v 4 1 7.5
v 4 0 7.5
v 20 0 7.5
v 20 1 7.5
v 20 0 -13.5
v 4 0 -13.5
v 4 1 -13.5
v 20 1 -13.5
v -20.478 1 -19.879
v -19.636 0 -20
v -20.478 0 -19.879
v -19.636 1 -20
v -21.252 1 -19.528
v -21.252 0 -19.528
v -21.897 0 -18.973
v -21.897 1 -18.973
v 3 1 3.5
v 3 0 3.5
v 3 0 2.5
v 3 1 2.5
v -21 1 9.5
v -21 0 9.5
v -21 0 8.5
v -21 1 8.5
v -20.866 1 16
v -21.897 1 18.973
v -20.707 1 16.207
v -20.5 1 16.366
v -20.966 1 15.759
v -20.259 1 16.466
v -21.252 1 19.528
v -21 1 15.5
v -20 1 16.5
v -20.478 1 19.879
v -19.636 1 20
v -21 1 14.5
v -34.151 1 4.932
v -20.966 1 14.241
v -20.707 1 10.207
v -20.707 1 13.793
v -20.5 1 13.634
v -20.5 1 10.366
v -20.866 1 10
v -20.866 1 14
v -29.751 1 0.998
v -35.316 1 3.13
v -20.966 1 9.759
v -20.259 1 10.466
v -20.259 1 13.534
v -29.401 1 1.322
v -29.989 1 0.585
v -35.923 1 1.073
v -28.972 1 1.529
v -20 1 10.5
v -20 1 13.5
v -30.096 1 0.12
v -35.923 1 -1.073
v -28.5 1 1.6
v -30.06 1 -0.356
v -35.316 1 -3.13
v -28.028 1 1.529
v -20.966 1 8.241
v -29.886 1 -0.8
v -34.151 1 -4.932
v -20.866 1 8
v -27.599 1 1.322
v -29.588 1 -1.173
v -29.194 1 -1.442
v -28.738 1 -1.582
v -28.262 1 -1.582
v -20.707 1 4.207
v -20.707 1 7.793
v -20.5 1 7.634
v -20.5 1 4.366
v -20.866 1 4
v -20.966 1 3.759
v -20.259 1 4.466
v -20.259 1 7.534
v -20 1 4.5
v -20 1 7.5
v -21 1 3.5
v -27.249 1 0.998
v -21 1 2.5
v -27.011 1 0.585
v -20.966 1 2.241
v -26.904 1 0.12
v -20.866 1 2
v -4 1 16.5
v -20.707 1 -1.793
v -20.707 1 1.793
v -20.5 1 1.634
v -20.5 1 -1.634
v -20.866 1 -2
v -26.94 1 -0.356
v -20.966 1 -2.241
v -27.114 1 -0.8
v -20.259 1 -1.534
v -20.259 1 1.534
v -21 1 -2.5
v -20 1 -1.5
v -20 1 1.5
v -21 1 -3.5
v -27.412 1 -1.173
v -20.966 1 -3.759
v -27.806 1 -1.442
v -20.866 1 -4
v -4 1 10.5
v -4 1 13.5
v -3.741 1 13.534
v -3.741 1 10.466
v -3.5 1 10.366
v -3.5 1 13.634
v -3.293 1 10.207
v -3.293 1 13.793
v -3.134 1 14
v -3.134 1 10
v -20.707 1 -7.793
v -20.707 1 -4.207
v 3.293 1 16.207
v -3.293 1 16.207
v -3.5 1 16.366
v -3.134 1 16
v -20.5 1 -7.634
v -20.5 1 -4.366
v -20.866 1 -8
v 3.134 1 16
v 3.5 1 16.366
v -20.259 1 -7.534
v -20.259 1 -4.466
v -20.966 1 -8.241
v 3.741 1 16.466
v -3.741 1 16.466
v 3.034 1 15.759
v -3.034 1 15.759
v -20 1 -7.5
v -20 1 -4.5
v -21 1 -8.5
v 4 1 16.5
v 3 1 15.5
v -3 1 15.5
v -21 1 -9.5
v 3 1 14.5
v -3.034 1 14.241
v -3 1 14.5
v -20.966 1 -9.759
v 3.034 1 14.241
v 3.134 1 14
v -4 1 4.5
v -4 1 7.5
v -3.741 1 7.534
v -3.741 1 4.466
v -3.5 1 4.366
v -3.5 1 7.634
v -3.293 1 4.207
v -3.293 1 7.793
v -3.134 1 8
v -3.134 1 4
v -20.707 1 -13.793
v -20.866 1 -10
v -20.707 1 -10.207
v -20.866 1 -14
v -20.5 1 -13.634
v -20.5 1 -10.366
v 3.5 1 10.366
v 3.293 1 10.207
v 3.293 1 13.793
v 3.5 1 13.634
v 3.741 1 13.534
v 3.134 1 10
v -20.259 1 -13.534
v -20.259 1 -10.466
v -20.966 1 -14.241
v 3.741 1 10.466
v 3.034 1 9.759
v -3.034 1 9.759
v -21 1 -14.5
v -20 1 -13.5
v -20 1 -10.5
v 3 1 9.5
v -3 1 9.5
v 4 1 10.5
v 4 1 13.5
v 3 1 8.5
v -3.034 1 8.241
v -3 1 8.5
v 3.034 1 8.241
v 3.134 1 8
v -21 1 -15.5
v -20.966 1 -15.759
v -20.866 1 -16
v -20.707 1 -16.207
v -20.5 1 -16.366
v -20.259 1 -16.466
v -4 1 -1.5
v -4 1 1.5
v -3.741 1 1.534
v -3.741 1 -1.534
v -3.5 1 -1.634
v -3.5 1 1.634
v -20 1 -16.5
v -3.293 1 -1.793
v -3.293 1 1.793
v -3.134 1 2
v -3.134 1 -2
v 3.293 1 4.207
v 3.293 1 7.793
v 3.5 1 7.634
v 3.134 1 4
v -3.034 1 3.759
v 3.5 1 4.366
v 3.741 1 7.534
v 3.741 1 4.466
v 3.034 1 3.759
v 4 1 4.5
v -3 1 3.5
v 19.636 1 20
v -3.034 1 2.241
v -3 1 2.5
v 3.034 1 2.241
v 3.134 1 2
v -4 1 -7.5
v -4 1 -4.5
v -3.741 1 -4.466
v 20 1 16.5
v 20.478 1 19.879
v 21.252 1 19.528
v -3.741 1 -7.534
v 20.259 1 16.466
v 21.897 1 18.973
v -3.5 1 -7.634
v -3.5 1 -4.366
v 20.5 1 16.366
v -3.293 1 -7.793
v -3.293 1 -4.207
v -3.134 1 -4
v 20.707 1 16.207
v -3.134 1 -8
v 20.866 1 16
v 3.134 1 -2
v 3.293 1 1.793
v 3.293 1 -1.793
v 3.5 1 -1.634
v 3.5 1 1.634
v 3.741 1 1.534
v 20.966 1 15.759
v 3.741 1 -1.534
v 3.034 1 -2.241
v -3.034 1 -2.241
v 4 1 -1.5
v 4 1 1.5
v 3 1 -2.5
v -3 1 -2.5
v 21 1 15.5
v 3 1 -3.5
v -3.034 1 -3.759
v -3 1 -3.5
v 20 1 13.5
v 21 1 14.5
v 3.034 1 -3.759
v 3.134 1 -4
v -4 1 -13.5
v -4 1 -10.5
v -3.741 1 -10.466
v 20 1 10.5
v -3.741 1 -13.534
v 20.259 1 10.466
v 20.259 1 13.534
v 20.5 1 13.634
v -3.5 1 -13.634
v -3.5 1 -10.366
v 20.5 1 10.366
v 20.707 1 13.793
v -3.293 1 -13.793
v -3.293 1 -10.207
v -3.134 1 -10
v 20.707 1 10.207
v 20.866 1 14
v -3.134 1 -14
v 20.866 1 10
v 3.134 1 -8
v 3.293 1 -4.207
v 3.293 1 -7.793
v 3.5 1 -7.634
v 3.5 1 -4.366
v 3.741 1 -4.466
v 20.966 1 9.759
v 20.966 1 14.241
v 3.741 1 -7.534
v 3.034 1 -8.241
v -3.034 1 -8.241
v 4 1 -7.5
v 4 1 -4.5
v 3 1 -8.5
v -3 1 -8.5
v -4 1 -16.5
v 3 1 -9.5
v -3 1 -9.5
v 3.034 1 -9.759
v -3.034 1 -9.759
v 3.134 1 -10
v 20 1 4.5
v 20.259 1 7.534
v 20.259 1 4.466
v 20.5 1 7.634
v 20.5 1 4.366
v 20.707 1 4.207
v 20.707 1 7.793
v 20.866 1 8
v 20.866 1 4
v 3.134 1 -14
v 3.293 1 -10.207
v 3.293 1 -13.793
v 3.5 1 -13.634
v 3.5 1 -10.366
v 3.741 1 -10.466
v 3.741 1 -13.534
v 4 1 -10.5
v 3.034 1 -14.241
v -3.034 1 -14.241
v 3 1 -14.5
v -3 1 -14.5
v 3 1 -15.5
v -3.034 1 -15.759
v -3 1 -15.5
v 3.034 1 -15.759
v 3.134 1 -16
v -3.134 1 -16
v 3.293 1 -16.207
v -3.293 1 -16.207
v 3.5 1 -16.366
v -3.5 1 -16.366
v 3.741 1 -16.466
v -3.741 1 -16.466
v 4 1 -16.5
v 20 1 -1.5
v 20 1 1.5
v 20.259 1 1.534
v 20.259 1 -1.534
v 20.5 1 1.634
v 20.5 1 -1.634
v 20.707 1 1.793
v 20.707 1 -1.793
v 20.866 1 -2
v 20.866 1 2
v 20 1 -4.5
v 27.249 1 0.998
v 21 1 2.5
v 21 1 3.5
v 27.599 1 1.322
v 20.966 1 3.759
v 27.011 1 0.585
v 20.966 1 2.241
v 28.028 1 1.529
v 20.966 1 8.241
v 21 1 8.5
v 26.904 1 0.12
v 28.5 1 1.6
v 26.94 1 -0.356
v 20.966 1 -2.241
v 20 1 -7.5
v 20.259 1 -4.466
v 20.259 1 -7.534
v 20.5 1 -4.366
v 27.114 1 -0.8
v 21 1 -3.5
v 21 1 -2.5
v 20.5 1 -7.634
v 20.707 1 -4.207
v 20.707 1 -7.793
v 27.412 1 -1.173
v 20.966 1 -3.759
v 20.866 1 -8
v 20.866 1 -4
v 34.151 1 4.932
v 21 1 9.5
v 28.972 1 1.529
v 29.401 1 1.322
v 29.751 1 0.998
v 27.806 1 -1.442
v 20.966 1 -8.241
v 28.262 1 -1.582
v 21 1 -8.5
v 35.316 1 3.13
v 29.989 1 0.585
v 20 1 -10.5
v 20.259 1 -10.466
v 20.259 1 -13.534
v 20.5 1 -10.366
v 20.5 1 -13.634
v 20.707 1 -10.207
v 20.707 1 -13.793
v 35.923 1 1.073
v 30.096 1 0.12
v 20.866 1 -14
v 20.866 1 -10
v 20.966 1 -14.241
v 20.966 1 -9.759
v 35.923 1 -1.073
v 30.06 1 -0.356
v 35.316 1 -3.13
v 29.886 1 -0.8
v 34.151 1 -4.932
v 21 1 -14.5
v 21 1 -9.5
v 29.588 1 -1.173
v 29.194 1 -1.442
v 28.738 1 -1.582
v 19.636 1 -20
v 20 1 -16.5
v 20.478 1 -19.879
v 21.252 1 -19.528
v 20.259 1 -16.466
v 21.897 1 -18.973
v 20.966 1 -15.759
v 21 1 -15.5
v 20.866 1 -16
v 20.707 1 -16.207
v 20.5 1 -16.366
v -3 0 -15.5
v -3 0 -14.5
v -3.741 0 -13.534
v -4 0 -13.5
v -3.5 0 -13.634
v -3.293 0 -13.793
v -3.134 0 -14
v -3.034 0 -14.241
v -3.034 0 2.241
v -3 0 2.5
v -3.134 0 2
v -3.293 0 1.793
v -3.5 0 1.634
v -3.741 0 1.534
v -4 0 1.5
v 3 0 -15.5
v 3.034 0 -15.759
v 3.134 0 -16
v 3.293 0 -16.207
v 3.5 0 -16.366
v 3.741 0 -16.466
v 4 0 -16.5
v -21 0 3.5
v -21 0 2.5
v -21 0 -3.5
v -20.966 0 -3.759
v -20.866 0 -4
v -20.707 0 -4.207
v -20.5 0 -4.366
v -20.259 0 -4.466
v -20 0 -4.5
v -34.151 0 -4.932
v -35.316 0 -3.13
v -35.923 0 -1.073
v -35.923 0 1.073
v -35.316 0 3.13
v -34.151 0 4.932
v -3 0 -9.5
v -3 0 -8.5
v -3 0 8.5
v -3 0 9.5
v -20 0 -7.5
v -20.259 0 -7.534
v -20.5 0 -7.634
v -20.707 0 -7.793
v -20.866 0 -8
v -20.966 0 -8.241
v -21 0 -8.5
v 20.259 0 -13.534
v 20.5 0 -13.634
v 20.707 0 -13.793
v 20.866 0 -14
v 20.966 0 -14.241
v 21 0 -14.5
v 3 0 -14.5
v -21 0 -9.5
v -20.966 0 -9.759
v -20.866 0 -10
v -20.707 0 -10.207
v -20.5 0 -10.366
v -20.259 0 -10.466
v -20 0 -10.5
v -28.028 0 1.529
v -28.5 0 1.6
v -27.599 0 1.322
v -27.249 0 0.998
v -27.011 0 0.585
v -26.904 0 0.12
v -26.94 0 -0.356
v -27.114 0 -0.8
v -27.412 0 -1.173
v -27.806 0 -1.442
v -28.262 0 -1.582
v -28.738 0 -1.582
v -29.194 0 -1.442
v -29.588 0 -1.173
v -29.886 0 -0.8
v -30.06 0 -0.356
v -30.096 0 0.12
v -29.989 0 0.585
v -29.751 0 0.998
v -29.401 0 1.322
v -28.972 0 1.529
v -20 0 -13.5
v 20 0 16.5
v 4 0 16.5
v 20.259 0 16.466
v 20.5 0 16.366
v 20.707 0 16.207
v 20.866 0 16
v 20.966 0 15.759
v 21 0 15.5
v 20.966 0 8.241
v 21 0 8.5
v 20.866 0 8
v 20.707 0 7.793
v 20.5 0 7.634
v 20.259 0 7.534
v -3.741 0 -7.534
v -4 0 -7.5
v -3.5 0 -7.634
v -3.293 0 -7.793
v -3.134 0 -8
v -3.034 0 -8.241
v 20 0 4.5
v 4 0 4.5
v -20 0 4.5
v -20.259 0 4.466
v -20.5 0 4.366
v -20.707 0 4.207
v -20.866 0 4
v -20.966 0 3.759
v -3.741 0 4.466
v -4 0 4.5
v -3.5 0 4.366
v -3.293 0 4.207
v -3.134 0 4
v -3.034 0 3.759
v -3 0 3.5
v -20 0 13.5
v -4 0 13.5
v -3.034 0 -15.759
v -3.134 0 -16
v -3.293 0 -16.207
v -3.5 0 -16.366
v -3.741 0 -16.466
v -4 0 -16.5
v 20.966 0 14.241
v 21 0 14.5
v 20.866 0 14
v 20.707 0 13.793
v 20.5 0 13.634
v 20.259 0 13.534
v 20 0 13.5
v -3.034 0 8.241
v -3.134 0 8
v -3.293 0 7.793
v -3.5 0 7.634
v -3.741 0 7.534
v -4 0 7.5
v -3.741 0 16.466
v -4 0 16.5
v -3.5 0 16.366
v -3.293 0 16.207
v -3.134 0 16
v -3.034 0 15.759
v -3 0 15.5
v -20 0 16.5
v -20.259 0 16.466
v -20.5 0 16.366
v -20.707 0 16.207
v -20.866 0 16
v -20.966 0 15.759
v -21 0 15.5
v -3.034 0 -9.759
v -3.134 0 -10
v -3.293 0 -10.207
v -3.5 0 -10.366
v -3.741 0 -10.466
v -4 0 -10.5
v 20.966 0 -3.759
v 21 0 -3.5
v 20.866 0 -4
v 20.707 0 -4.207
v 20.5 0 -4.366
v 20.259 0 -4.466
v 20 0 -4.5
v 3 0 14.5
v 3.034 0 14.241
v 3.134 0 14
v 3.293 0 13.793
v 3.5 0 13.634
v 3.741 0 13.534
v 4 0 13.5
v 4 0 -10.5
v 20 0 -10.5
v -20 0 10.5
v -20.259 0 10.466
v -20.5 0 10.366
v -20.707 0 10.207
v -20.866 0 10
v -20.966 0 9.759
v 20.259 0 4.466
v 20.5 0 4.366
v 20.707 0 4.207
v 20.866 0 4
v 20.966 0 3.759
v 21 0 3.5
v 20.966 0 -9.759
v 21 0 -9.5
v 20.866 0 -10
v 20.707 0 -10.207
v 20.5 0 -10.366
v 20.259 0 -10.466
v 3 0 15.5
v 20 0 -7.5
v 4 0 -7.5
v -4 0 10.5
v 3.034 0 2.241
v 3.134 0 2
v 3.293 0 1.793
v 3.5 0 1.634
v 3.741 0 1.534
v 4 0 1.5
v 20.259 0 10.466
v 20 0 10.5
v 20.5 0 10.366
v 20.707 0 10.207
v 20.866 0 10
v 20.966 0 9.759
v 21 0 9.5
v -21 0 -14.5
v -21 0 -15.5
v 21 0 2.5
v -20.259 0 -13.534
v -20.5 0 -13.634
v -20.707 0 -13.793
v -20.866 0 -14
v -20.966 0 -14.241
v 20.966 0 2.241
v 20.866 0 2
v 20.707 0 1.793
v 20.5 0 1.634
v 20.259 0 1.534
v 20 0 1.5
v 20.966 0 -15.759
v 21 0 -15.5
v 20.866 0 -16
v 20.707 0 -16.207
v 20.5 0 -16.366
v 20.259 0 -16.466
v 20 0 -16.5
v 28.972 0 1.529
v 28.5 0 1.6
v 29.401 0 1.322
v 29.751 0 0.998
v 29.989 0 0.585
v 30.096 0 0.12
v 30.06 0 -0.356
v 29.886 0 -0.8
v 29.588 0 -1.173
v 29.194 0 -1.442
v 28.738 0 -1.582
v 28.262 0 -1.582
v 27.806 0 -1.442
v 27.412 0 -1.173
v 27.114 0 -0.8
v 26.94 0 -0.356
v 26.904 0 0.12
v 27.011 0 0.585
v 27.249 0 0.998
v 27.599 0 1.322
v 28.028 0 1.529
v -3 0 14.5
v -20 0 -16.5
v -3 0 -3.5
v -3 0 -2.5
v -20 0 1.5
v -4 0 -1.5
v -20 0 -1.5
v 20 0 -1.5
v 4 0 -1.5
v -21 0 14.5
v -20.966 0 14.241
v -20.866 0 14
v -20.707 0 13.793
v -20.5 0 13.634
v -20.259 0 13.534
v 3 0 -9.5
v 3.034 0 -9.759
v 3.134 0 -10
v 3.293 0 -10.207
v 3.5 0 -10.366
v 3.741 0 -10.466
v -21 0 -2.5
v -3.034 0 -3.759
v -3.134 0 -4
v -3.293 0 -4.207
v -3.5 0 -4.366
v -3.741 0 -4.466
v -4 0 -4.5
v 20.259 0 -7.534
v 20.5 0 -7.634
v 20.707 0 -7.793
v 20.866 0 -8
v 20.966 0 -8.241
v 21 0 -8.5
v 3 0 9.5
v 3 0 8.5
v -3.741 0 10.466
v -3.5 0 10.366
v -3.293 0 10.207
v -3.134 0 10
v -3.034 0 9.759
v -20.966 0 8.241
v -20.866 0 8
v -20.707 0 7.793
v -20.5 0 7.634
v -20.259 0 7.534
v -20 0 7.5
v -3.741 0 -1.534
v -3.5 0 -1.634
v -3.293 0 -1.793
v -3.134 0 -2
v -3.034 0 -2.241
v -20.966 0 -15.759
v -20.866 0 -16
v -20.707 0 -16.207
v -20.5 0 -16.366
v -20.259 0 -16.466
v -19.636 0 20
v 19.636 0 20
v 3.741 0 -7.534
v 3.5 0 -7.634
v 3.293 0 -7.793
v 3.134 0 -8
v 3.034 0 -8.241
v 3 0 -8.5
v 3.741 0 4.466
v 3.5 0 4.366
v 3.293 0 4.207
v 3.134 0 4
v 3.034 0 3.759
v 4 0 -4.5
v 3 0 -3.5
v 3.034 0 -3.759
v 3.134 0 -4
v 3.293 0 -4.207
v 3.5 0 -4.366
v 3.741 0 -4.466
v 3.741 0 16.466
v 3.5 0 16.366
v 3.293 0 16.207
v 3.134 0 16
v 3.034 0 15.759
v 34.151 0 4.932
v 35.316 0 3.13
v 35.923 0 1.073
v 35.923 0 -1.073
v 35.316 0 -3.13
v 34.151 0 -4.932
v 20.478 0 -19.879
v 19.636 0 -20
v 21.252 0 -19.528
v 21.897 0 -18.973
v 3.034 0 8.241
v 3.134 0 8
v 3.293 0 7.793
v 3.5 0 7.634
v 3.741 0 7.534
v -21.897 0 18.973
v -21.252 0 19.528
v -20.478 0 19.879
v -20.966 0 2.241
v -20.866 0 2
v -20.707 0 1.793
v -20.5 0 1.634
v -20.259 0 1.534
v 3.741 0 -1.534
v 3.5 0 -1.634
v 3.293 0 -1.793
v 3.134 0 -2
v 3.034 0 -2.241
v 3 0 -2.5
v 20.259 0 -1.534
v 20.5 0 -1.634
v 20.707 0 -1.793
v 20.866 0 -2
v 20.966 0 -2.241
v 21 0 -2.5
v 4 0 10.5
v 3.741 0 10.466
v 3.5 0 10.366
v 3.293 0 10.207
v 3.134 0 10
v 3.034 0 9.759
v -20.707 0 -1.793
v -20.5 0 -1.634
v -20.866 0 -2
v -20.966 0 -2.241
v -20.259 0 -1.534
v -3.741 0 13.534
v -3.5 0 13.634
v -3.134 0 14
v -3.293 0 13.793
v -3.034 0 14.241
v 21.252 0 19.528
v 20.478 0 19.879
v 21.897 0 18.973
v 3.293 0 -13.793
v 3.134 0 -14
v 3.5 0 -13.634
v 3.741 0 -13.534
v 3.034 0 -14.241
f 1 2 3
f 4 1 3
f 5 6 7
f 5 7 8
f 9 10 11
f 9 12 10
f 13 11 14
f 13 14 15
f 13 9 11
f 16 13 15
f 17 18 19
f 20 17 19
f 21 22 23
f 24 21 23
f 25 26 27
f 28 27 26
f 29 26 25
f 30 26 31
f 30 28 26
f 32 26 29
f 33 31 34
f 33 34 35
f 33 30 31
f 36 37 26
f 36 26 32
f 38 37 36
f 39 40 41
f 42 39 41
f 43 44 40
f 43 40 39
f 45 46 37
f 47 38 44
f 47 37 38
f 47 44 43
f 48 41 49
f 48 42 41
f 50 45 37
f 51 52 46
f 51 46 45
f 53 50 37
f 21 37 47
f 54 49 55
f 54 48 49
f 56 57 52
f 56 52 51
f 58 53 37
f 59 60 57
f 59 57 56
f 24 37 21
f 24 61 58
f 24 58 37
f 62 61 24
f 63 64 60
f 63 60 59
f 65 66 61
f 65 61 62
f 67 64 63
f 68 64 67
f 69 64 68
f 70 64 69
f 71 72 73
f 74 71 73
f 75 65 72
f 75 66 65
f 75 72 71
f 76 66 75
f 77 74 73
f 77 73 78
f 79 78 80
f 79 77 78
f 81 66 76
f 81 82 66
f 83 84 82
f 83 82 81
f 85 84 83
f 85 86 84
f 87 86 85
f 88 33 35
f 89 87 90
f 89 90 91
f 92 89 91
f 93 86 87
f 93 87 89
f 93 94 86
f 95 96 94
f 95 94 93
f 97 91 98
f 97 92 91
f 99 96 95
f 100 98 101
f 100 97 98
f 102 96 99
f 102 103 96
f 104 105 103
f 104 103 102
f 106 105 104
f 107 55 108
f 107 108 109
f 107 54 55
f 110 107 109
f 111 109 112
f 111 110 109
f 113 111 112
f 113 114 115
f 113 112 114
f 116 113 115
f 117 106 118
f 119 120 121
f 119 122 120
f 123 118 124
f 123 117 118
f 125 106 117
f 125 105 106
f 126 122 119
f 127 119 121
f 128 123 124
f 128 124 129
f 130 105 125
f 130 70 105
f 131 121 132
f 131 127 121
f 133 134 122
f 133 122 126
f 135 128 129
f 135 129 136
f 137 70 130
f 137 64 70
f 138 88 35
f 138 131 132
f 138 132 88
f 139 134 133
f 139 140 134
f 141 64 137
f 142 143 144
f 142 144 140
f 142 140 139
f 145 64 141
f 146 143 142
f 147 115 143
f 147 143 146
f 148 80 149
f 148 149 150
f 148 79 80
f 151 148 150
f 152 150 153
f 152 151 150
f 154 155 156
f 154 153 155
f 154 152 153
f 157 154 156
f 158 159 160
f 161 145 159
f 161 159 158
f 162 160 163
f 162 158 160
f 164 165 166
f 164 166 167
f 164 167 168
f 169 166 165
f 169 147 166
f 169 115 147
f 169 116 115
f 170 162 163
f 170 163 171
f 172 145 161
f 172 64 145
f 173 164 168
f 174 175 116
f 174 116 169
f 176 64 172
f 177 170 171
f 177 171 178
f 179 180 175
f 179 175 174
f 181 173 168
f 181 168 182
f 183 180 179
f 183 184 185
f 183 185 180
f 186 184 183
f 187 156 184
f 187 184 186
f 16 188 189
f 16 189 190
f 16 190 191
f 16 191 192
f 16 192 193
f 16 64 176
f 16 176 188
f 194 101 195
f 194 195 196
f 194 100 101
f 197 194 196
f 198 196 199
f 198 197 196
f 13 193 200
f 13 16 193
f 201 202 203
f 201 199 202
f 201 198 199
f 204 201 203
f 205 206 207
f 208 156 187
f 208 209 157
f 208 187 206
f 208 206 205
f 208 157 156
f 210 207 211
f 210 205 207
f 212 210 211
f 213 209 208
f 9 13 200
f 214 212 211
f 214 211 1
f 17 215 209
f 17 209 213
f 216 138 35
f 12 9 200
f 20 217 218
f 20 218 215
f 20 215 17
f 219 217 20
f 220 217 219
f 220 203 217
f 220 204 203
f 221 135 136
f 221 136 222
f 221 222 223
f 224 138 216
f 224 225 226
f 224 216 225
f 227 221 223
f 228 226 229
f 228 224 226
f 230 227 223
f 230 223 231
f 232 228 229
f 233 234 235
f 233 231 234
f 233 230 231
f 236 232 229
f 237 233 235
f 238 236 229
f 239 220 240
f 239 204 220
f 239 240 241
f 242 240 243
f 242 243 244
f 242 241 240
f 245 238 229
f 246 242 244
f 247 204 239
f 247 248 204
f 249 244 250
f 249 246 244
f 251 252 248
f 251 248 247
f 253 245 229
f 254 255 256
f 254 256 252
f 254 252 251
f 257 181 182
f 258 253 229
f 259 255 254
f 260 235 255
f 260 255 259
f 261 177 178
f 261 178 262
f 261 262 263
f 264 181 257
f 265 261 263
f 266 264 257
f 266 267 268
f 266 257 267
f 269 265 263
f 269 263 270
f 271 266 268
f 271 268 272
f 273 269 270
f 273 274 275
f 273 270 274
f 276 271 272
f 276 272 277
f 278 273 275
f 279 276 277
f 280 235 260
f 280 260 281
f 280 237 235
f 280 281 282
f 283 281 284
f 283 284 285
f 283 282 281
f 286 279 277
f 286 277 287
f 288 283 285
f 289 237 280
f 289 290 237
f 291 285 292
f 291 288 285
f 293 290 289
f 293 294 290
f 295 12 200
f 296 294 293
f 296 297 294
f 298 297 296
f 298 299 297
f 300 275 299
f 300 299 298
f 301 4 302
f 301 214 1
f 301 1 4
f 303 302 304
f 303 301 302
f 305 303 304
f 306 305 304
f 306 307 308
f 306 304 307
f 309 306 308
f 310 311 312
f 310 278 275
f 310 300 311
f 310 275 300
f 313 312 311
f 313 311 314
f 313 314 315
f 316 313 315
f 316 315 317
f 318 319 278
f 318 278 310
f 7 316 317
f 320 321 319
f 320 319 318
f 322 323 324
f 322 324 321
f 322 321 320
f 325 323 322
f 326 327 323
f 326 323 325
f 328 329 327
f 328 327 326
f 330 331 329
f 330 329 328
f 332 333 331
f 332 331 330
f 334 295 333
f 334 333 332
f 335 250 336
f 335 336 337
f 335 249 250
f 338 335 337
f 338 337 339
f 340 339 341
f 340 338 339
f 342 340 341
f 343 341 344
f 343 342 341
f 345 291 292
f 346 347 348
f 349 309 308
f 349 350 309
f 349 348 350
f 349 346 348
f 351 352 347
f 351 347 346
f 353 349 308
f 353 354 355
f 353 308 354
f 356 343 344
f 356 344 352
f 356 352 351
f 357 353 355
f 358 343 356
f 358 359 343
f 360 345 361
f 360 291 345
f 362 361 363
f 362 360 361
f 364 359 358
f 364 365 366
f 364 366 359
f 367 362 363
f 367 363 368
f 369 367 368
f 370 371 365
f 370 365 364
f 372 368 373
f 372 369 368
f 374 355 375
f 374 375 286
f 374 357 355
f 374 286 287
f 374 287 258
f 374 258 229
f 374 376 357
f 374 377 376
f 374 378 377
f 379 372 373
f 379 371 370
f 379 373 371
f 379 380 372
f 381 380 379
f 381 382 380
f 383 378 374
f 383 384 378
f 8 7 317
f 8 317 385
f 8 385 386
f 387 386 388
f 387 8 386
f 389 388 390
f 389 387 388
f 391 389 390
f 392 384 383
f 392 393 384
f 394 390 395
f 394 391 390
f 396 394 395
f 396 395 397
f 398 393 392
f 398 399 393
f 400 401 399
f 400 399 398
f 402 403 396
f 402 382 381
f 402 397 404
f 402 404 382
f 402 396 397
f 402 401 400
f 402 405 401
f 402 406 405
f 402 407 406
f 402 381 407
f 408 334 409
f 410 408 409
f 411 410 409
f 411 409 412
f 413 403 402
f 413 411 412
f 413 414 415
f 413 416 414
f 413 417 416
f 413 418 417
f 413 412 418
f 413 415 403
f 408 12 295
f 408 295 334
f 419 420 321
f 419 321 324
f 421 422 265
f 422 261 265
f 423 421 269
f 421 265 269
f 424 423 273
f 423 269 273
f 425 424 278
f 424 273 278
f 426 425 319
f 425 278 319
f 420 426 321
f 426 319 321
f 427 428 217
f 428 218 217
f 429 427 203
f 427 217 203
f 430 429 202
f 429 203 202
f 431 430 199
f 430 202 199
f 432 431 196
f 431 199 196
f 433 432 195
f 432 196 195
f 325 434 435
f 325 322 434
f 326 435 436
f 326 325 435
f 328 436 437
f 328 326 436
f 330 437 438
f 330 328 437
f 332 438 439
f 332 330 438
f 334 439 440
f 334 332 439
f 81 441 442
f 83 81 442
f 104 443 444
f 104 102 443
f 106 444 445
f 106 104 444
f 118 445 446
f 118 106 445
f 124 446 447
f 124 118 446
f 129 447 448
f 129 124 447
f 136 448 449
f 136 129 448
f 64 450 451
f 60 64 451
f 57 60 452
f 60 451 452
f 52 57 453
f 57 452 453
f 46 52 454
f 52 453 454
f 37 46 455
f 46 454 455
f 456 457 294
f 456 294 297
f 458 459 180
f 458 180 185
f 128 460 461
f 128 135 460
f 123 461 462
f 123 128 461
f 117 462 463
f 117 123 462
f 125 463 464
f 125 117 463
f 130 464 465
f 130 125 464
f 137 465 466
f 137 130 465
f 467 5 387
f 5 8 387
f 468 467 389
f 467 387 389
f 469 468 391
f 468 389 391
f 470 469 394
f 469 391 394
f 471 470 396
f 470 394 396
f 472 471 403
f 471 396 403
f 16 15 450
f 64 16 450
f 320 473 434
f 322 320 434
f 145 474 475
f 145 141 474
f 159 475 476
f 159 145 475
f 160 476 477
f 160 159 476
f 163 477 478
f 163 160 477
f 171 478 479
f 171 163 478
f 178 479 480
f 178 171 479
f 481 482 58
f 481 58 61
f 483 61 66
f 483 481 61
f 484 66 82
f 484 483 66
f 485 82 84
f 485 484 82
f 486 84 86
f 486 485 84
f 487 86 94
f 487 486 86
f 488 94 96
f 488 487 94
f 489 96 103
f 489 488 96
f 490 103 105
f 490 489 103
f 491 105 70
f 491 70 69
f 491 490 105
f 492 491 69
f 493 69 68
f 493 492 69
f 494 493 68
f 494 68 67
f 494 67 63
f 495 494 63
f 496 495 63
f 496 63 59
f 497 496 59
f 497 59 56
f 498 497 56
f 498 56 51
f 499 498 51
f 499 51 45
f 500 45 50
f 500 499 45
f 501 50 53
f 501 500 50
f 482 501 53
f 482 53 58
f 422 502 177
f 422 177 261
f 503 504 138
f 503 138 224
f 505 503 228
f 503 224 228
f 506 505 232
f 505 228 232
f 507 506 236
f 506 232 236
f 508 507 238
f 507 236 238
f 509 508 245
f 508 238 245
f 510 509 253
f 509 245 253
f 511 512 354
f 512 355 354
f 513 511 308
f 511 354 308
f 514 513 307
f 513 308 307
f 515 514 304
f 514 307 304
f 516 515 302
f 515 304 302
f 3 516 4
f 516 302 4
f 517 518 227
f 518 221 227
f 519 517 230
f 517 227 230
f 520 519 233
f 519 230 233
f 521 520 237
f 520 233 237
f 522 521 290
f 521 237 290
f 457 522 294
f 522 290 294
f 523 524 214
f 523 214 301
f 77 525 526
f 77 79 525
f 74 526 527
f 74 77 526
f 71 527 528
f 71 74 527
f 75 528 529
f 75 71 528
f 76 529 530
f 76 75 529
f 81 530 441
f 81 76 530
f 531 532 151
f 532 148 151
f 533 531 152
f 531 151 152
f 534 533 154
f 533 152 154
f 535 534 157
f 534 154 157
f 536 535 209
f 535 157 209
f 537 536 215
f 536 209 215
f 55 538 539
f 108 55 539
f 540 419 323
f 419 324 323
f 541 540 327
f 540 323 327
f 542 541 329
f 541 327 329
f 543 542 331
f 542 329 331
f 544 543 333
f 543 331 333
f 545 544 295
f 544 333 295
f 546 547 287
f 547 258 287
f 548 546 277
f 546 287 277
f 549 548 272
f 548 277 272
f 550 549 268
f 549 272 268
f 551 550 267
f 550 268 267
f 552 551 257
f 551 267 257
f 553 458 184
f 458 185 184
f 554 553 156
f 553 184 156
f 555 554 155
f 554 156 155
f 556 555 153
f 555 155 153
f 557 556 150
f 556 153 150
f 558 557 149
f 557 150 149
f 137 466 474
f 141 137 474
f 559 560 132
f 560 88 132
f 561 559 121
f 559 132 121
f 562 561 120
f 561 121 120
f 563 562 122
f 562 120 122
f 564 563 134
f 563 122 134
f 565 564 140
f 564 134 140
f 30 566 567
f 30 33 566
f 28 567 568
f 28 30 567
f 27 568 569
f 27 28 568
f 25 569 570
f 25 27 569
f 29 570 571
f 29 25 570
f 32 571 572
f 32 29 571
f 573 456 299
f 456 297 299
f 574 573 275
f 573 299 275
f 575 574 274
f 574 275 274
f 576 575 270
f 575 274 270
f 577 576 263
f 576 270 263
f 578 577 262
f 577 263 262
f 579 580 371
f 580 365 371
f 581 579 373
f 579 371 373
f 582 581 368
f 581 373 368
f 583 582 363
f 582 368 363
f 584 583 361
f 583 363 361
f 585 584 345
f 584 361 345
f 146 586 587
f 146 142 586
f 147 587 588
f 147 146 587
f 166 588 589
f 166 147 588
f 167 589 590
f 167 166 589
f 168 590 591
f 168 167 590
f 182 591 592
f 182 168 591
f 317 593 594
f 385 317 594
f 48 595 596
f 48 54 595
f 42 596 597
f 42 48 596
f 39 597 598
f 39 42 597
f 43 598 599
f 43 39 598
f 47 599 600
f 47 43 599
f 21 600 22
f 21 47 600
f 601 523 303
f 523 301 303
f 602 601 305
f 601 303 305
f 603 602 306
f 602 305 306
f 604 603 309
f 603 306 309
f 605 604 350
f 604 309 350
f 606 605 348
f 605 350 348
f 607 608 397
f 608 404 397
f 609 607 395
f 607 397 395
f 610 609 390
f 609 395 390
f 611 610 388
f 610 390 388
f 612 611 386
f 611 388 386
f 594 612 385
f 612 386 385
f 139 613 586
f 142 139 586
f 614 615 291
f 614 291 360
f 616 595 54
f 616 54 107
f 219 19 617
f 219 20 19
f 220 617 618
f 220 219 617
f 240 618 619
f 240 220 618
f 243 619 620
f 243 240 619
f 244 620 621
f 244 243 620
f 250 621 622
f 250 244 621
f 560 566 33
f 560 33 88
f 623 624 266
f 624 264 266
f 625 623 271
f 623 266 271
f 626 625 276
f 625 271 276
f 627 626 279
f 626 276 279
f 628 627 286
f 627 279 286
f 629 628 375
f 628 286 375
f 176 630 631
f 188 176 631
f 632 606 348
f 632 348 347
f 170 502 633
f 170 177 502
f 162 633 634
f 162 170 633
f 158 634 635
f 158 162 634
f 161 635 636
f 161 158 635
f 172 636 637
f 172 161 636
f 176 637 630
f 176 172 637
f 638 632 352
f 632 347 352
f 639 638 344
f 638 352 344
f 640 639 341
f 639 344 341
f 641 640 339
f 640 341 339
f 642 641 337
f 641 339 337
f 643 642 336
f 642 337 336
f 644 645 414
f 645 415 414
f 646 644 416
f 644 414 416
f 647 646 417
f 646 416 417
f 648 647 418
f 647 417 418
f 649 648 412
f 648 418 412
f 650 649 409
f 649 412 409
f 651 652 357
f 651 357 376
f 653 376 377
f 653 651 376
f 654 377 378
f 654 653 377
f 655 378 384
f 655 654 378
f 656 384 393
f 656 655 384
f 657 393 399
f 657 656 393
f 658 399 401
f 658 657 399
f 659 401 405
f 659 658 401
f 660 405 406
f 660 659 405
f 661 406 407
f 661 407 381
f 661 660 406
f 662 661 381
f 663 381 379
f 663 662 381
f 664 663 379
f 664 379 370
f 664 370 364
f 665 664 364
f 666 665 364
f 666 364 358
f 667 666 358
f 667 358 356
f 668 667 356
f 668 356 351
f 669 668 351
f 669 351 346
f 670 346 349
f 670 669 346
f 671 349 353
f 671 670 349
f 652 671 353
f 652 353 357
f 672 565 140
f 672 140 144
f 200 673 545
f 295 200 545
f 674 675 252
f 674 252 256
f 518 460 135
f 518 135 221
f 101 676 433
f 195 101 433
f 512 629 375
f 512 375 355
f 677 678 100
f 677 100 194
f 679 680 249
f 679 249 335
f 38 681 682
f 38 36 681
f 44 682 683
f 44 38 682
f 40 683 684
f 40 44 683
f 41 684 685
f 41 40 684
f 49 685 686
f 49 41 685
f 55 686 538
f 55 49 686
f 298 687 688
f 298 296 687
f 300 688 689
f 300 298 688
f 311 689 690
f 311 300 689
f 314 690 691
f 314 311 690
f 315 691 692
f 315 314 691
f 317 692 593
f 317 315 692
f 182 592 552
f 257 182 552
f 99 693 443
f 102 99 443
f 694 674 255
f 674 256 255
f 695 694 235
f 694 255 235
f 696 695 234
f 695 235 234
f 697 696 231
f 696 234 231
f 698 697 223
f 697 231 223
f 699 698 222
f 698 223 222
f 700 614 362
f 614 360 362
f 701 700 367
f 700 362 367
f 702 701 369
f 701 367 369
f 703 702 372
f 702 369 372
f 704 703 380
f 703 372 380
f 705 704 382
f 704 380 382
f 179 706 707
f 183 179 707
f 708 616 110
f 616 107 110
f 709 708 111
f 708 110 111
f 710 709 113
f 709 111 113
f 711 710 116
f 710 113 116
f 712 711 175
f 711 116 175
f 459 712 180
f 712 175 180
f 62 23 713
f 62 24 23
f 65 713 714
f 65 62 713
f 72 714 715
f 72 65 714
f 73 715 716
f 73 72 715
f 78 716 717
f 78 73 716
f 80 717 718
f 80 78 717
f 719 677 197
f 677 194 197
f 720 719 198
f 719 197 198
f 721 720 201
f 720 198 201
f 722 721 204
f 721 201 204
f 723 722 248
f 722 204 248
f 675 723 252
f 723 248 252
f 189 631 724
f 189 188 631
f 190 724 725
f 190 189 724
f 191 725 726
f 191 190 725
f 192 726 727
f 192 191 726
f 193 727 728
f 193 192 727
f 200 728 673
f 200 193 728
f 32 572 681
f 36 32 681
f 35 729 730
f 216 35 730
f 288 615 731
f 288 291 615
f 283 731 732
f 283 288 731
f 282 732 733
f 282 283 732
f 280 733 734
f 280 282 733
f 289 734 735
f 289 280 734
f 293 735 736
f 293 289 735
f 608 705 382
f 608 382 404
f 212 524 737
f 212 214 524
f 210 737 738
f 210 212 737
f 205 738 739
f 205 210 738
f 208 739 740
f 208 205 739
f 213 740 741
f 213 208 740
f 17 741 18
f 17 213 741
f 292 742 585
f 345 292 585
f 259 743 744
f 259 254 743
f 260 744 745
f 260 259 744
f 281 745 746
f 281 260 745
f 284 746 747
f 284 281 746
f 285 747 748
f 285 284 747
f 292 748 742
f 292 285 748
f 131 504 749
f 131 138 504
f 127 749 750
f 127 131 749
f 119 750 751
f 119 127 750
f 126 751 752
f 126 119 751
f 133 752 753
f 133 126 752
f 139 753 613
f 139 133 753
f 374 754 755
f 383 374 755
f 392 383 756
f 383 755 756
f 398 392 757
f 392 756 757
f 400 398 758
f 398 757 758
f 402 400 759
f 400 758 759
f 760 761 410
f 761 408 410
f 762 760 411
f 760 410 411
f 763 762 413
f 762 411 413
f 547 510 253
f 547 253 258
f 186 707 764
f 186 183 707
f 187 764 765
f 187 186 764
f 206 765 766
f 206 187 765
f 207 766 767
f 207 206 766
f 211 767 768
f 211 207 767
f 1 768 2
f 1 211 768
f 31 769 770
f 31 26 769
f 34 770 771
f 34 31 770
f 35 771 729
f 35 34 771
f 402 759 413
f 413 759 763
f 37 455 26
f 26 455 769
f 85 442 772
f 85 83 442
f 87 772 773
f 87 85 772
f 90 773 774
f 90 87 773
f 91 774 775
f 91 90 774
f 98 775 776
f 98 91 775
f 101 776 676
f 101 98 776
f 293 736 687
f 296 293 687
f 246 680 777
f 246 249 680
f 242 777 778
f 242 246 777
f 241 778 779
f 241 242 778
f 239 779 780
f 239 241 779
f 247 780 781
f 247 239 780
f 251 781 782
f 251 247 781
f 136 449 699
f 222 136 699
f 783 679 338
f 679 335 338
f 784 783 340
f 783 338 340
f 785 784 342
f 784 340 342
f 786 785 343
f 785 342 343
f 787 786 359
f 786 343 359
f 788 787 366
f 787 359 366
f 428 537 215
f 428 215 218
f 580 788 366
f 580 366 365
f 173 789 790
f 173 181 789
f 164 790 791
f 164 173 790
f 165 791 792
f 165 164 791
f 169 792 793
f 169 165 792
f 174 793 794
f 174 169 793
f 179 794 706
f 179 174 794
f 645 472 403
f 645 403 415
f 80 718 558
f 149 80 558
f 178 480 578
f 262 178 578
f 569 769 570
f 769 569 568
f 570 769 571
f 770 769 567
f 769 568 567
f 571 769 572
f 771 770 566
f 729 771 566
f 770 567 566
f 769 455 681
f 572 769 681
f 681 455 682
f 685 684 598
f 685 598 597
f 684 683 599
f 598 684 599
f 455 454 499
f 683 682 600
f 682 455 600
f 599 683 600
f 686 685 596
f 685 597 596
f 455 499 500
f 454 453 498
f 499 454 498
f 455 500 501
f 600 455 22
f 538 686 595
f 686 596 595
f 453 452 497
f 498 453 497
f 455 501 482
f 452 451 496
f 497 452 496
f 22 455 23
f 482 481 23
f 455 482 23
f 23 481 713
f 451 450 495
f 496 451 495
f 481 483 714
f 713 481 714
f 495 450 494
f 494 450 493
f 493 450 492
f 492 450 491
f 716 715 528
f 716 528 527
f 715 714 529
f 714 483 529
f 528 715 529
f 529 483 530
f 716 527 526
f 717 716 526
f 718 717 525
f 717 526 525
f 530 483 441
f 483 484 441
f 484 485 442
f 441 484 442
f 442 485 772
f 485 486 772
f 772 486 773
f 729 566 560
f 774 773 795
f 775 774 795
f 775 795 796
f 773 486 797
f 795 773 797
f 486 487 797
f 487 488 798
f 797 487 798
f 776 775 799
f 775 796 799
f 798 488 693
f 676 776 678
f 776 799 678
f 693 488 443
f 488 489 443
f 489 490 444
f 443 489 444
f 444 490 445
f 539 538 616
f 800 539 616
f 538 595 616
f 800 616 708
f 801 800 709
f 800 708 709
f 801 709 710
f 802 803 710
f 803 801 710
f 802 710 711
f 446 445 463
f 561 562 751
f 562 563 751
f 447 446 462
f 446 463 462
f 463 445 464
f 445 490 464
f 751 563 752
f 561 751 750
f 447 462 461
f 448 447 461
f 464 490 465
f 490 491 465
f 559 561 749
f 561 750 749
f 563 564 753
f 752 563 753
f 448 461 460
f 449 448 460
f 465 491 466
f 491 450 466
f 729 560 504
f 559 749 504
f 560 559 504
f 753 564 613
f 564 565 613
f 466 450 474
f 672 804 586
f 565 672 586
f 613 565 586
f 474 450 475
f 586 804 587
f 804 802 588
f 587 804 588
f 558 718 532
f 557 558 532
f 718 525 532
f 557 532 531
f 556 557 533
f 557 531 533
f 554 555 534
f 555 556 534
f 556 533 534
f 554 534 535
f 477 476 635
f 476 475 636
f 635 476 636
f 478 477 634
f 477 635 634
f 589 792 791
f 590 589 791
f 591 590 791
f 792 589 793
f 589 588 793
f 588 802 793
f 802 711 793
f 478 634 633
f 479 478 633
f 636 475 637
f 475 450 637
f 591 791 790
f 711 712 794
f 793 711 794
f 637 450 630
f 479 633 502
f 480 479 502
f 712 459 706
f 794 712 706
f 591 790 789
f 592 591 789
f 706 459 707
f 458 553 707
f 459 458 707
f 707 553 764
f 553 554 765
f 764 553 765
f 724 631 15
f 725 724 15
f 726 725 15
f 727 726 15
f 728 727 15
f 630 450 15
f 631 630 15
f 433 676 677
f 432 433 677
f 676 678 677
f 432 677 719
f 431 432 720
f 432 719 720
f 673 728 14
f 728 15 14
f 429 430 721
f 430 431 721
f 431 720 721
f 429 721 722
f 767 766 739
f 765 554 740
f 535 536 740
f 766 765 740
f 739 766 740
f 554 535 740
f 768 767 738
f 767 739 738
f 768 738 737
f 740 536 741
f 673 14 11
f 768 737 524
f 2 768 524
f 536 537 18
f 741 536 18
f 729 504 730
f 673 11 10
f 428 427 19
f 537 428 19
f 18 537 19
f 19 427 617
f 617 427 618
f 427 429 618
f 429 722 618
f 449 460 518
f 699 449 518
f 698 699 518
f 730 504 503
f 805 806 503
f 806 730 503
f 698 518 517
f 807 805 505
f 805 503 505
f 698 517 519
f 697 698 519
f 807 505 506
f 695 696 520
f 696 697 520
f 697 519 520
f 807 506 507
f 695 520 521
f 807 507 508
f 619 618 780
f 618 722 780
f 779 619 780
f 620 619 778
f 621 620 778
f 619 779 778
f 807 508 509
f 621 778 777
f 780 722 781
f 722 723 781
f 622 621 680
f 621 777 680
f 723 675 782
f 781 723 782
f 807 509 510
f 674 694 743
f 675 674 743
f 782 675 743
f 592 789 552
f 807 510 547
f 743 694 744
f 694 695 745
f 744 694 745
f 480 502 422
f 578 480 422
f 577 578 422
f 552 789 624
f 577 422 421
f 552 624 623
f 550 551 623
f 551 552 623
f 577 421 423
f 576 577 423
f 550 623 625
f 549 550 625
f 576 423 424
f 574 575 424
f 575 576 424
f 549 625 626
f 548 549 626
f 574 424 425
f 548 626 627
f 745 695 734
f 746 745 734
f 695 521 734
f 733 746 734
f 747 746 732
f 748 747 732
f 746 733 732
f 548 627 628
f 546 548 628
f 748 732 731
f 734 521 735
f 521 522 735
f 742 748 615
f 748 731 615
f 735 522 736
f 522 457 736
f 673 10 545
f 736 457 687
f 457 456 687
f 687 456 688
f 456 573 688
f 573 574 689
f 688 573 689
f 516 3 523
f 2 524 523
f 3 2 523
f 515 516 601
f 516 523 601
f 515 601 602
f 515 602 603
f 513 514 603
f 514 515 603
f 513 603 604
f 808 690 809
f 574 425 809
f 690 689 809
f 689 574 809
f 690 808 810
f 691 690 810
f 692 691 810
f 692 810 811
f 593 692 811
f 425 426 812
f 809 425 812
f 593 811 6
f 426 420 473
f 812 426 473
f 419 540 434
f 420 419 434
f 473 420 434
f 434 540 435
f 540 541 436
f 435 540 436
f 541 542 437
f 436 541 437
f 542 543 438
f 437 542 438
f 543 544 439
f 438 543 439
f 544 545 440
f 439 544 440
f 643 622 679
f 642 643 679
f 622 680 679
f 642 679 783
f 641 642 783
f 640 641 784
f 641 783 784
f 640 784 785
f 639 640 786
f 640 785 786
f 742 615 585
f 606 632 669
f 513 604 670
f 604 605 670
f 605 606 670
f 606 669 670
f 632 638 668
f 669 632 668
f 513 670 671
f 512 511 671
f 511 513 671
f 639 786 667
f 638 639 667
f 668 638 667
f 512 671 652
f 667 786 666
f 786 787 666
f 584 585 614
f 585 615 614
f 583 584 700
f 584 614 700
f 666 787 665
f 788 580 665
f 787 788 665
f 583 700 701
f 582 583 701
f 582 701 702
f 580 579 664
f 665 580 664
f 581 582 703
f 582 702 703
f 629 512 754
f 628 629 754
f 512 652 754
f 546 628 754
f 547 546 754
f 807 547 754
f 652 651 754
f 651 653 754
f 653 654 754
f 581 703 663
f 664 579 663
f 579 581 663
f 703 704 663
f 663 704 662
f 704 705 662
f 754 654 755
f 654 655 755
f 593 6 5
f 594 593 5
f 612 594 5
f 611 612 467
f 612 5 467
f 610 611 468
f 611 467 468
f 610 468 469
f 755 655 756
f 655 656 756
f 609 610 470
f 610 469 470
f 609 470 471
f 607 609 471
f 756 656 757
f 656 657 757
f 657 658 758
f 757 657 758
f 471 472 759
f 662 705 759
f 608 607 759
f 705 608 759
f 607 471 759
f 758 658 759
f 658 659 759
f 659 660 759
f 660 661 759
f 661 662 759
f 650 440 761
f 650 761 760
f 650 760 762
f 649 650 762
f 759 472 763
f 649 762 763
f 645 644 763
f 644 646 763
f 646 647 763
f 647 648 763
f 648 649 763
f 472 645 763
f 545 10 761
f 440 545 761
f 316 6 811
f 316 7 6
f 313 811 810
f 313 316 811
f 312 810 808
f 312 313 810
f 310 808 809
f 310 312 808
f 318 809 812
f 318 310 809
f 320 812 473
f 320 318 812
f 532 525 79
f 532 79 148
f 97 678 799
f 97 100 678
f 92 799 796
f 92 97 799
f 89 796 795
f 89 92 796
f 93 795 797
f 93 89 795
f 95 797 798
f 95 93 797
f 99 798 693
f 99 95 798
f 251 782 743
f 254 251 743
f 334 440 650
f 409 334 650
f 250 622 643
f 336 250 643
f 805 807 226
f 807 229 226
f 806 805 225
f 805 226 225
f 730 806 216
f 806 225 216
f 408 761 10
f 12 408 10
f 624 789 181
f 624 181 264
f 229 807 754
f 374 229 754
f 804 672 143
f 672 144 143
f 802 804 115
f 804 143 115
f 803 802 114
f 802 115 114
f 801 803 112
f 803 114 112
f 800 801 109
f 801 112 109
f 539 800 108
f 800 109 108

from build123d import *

# Parameters (mm, degrees)
SKETCH_1_W      = 18
SKETCH_1_H      = 3
SKETCH_1_R      = 1.6
EXTRUDE_1_DEPTH = 1
FILLET_1_R      = 3
FILLET_2_R      = 1


with BuildPart() as part:
    # 草图1 → 凸台-拉伸1 (new body)
    with BuildSketch(Plane(origin=(0, 0, 0), x_dir=(1, 0, 0), z_dir=(0, 1, 0))):
        with BuildLine():
            Line((21, 20), (-21, 20))
            Line((-21, 20), (-34.150684932, 4.931506849))
            ThreePointArc((-34.150684932, 4.931506849), (-36, 0), (-34.150684932, -4.931506849))
            Line((-34.150684932, -4.931506849), (-21, -20))
            Line((-21, -20), (21, -20))
            Line((21, -20), (34.150684932, -4.931506849))
            ThreePointArc((34.150684932, -4.931506849), (36, 0), (34.150684932, 4.931506849))
            Line((34.150684932, 4.931506849), (21, 20))
        make_face()
        with Locations((-12, -15)):
            Rectangle(SKETCH_1_W, SKETCH_1_H, mode=Mode.SUBTRACT)
        with Locations((-12, -9)):
            Rectangle(SKETCH_1_W, SKETCH_1_H, mode=Mode.SUBTRACT)
        with Locations((-12, -3)):
            Rectangle(SKETCH_1_W, SKETCH_1_H, mode=Mode.SUBTRACT)
        with Locations((12, -15)):
            Rectangle(SKETCH_1_W, SKETCH_1_H, mode=Mode.SUBTRACT)
        with Locations((12, -9)):
            Rectangle(SKETCH_1_W, SKETCH_1_H, mode=Mode.SUBTRACT)
        with Locations((12, -3)):
            Rectangle(SKETCH_1_W, SKETCH_1_H, mode=Mode.SUBTRACT)
        with Locations((-12, 3)):
            Rectangle(SKETCH_1_W, SKETCH_1_H, mode=Mode.SUBTRACT)
        with Locations((-12, 9)):
            Rectangle(SKETCH_1_W, SKETCH_1_H, mode=Mode.SUBTRACT)
        with Locations((-12, 15)):
            Rectangle(SKETCH_1_W, SKETCH_1_H, mode=Mode.SUBTRACT)
        with Locations((12, 3)):
            Rectangle(SKETCH_1_W, SKETCH_1_H, mode=Mode.SUBTRACT)
        with Locations((12, 9)):
            Rectangle(SKETCH_1_W, SKETCH_1_H, mode=Mode.SUBTRACT)
        with Locations((12, 15)):
            Rectangle(SKETCH_1_W, SKETCH_1_H, mode=Mode.SUBTRACT)
        with Locations(Location((-28.5, 0, 0), (0, 0, 270))):
            Circle(SKETCH_1_R, mode=Mode.SUBTRACT)
        with Locations(Location((28.5, 0, 0), (0, 0, 270))):
            Circle(SKETCH_1_R, mode=Mode.SUBTRACT)
    extrude(amount=EXTRUDE_1_DEPTH)

    # 圆角1
    fillet_1_edges = [part.edges().sort_by_distance(p)[0] for p in [
        (21, 0.5, 20),
        (-21, 0.5, 20),
        (-21, 0.5, -20),
        (21, 0.5, -20),
    ]]
    fillet(fillet_1_edges, radius=FILLET_1_R)

    # 圆角2
    fillet_2_edges = [part.edges().sort_by_distance(p)[0] for p in [
        (-21, 0.5, 13.5),
        (-21, 0.5, 16.5),
        (-3, 0.5, 16.5),
        (-3, 0.5, 13.5),
        (21, 0.5, 16.5),
        (21, 0.5, 13.5),
        (3, 0.5, 13.5),
        (3, 0.5, 16.5),
        (21, 0.5, 10.5),
        (21, 0.5, 7.5),
        (3, 0.5, 7.5),
        (3, 0.5, 10.5),
        (21, 0.5, 4.5),
        (21, 0.5, 1.5),
        (3, 0.5, 1.5),
        (3, 0.5, 4.5),
        (21, 0.5, -1.5),
        (21, 0.5, -4.5),
        (3, 0.5, -4.5),
        (3, 0.5, -1.5),
        (21, 0.5, -7.5),
        (21, 0.5, -10.5),
        (3, 0.5, -10.5),
        (3, 0.5, -7.5),
        (21, 0.5, -13.5),
        (21, 0.5, -16.5),
        (3, 0.5, -16.5),
        (3, 0.5, -13.5),
        (-3, 0.5, 10.5),
        (-3, 0.5, 7.5),
        (-21, 0.5, 7.5),
        (-21, 0.5, 10.5),
        (-3, 0.5, 4.5),
        (-3, 0.5, 1.5),
        (-21, 0.5, 1.5),
        (-21, 0.5, 4.5),
        (-3, 0.5, -1.5),
        (-3, 0.5, -4.5),
        (-21, 0.5, -4.5),
        (-21, 0.5, -1.5),
        (-3, 0.5, -7.5),
        (-3, 0.5, -10.5),
        (-21, 0.5, -10.5),
        (-21, 0.5, -7.5),
        (-3, 0.5, -13.5),
        (-3, 0.5, -16.5),
        (-21, 0.5, -16.5),
        (-21, 0.5, -13.5),
    ]]
    fillet(fillet_2_edges, radius=FILLET_2_R)


solid = part.part
